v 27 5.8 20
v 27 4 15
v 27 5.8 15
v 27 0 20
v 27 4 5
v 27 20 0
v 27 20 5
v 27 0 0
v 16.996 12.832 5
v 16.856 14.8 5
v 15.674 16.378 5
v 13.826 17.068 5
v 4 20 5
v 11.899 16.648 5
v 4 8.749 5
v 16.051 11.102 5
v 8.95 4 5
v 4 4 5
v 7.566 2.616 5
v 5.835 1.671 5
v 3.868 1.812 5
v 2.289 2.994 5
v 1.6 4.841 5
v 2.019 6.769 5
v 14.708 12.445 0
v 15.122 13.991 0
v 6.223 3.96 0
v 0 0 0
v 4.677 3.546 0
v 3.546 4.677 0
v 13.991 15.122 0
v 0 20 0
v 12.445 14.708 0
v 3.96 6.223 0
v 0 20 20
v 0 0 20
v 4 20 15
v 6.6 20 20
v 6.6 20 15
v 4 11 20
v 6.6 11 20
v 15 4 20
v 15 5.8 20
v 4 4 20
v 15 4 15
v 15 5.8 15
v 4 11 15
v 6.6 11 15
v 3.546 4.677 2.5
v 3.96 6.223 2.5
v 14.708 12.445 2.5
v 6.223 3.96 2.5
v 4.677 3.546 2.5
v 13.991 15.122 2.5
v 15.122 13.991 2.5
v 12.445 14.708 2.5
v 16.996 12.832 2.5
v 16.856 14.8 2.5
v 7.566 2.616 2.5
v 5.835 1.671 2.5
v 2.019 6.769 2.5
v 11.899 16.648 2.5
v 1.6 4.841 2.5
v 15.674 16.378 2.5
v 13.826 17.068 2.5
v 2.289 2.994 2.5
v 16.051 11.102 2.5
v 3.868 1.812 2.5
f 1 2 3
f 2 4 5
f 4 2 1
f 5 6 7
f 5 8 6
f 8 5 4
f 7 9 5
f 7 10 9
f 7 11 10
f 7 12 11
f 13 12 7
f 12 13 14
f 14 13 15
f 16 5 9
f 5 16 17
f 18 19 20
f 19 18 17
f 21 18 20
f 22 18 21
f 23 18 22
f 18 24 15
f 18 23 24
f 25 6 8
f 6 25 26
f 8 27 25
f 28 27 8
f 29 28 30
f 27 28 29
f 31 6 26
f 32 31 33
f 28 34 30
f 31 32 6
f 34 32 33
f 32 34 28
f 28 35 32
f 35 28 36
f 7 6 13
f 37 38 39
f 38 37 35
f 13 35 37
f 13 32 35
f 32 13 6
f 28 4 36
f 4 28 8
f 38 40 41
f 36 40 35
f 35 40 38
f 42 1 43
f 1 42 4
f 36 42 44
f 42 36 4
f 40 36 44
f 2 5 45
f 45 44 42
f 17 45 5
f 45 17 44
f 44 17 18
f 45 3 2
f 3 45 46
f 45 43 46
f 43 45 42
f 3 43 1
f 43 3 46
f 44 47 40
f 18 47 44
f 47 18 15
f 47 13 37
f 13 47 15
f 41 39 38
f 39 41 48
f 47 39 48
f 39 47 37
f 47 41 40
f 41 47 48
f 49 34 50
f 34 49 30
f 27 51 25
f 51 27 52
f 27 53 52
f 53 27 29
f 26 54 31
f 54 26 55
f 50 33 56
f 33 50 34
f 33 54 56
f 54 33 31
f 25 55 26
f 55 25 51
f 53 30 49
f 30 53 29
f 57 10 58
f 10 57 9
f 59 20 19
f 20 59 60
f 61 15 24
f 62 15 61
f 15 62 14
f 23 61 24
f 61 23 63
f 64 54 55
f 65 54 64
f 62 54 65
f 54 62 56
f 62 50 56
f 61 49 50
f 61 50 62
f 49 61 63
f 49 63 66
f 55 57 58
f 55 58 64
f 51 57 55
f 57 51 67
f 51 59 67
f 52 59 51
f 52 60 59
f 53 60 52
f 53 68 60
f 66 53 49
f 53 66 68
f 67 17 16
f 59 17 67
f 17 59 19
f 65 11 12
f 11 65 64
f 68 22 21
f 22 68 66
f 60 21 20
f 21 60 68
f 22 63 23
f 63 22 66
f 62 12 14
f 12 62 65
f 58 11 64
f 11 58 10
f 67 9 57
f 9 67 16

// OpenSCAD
// OpenSCAD model by tselling
// based on OpenSCAD thing:726983 by markwal
// dimensions in mm

// Allows you to modify almost everything on the clip
// In general the Back Right corner and the Front Left 
// corner use the same clip so just duplicate it unless 
// you need something different.  I wanted my side 
// walls to be shorter than the back/front walls to avoid 
// hitting my custom filament spool holder on the inside 
// of my Dreamer.  You can just make the back & right lengths
// the same for a square piece if you don't need a shorter
// side.

// Just change this variable for opposite corners (1 vs 0)
doOppositeCorners=0;

// (mm) thickness of the base of the clip 
//   (too thick may require longer screw)
baseThickness=5;

// (mm) adjust thickness of the wall of the clip
wallThickness=4;

// (mm) thickness of build plate without glass (round up)
// This will be the wall height.
plateThickness=10;

// (mm) thickness of the glass plate (round down)
// This will be the tab height.
glassThickness=5;

// (mm) how long at the back (X-Axis)
baseBack=27;

// (mm) how long on the side (Y-Axis)
baseRight=20;

// (mm) length of back wall (shorten if you want open corner)
wallBack=27;

// (mm) length of right wall (shorten if you want open corner)
wallRight=20;

// Back tab length
tabBackLength=12;

// Right tab length
tabRightLength=9;

// (mm) space in back/front of glass plate (when centered)
tabBackThickness=1.8;

// (mm) space on the left/right side of glass plate (when centered)
tabRightThickness=2.6;

// (mm) slotLength for bolt
slotLength=12;

// (mm) width of the bolt slot
boltDiameter=3.2;

// (mm) allows you to leave  original nut attached to build
// plate and add wingnut to the bottom.
nutDiameter=7;
nutHeight=2.5;

difference() {
union() {
    
total_height = baseThickness+plateThickness+glassThickness; 

baseX = doOppositeCorners ? baseRight : baseBack;
baseY = doOppositeCorners ? baseBack : baseRight;
wallX = doOppositeCorners ? wallRight : wallBack;
wallY = doOppositeCorners ? wallBack : wallRight;
tabX = doOppositeCorners ? tabRightLength : tabBackLength;
tabY = doOppositeCorners ? tabBackLength : tabRightLength;
tabX_thickness = doOppositeCorners ? tabRightThickness : tabBackThickness;
tabY_thickness = doOppositeCorners ? tabBackThickness : tabRightThickness;
    
// base
cube([baseX,baseY,baseThickness]);
 
// Wall on X Axis
translate([baseX-wallX,0,0]) 
    cube([wallX,wallThickness, total_height]);

// Tab on X Axis
translate([baseX-tabX,0,baseThickness+plateThickness])
	cube([tabX,wallThickness+tabX_thickness,glassThickness]);
    
// Wall on Y Axis
translate([0,baseY-wallY,0])
	cube([wallThickness,wallY,total_height]);
    
// Tab on Y Axis
translate([0,baseY-tabY,baseThickness+plateThickness])
	cube([wallThickness+tabY_thickness,tabY,glassThickness]);
}

    //remove the slots 
    rotate([0,0,-45]) {
        translate([0,wallThickness+boltDiameter,0]){
    
            // bolt slot
            hull() {
                cylinder(h=baseThickness,d=boltDiameter);
                translate([0, slotLength,0])
                    cylinder(h=baseThickness,d=boltDiameter);
            }
            
            // nut slot       
            translate([0,0, baseThickness-nutHeight]) hull() {
                cylinder(h=nutHeight,d=nutDiameter);
                translate([0, slotLength, 0]) 
                    cylinder(h=nutHeight,d=nutDiameter); 
            }
        }
    }
}
